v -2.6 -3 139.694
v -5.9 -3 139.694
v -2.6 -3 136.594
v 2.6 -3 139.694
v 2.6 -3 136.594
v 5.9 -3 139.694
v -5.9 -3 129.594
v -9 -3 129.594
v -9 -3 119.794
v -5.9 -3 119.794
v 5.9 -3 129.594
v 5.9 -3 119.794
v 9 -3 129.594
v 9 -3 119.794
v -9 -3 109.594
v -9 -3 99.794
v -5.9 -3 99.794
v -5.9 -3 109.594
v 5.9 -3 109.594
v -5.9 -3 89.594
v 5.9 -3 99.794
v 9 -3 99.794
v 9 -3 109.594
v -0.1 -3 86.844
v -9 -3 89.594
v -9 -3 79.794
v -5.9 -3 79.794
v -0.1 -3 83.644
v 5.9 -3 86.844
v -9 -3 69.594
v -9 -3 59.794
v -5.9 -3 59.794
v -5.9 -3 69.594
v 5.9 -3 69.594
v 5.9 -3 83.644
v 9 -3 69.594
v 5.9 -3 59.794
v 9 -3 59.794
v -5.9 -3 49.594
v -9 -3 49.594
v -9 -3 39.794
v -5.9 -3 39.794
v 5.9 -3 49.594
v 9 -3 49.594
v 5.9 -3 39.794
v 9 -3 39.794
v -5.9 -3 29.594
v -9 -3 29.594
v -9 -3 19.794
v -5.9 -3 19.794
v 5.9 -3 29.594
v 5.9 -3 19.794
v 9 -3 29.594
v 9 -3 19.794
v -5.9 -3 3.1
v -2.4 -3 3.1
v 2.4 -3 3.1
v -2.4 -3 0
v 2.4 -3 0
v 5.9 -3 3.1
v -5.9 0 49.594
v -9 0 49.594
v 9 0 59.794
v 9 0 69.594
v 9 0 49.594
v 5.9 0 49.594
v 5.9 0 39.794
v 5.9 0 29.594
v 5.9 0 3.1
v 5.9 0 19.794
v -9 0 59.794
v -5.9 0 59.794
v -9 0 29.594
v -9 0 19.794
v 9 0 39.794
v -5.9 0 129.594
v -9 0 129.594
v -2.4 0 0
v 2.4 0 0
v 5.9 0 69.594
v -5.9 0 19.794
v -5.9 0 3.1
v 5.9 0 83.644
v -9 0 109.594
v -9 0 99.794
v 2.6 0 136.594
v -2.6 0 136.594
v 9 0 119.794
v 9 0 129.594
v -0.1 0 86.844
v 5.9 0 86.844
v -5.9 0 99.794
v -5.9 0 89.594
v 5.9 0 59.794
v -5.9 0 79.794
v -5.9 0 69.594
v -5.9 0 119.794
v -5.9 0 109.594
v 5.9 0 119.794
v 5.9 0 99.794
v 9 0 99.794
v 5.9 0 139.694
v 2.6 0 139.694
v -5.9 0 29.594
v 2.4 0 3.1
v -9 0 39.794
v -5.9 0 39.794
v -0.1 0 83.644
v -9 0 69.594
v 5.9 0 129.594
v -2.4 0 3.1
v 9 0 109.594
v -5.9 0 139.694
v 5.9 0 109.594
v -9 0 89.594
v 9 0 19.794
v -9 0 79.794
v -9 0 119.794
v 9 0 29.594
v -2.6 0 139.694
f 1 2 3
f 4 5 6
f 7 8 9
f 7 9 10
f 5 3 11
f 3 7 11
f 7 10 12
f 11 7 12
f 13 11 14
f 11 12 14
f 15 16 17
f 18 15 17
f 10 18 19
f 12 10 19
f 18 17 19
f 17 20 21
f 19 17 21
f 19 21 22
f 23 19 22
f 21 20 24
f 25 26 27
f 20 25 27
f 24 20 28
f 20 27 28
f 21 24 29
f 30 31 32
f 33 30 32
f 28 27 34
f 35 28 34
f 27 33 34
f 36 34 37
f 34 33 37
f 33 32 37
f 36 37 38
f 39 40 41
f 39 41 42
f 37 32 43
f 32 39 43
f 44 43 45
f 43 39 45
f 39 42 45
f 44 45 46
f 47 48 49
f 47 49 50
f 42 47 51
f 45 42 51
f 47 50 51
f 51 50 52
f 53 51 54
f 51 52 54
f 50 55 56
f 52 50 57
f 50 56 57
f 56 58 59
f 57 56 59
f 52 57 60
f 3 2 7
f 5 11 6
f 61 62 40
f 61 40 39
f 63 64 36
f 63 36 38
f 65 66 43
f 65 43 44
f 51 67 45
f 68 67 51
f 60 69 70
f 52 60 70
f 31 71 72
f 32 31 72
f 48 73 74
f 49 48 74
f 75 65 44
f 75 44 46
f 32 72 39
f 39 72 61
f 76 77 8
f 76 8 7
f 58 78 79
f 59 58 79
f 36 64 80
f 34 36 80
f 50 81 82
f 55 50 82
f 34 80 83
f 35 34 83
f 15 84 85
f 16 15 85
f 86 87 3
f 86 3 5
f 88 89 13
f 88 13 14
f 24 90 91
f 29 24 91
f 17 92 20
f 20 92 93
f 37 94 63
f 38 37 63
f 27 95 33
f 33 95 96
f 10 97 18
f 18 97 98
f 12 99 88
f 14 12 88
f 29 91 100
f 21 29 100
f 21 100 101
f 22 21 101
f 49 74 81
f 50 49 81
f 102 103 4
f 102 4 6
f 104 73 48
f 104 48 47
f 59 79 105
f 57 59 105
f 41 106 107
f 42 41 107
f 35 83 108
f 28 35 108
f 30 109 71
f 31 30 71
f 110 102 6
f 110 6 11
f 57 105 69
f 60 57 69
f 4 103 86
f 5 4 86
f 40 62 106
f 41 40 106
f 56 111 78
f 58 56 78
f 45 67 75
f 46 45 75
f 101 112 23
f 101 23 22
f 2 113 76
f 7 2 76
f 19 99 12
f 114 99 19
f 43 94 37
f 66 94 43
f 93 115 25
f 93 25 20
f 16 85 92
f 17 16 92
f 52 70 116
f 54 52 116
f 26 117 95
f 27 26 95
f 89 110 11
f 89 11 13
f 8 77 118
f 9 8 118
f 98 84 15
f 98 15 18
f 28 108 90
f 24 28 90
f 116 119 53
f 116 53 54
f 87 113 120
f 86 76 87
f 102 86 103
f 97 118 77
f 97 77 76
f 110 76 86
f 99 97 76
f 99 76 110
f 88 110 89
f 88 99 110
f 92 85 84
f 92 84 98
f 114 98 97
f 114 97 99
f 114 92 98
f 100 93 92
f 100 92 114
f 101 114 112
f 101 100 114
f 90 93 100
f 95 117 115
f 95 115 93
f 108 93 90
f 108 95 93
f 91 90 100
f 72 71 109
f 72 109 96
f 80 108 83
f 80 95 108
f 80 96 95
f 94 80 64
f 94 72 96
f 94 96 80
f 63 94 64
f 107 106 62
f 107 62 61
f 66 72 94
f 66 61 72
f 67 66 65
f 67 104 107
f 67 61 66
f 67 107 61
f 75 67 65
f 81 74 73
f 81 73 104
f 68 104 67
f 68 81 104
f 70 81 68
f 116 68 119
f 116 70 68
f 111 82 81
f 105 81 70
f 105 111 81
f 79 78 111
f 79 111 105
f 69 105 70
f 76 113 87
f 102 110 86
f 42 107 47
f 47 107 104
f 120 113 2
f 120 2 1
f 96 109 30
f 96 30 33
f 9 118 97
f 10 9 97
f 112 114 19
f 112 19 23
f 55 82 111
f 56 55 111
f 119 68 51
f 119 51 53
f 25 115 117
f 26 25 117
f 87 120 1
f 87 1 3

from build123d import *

# Parameters (mm, degrees)
SKETCH1_W           = 18
SKETCH1_H           = 139.694434203
BOSS_EXTRUDE1_DEPTH = 3
SKETCH4_W           = 3.2
SKETCH4_H           = 10.2
SKETCH4_W_2         = 5.2
SKETCH4_H_2         = 3.2
CUT_EXTRUDE2_DEPTH  = 4


with BuildPart() as part:
    # Sketch1 → Boss-Extrude1 (new body)
    with BuildSketch(Plane(origin=(0, 0, 0), x_dir=(1, 0, 0), z_dir=(0, 1, 0))):
        with Locations((0, -69.847217102)):
            Rectangle(SKETCH1_W, SKETCH1_H)
    extrude(amount=-BOSS_EXTRUDE1_DEPTH)

    # Sketch4 → Cut-Extrude2 (cut, through all)
    with BuildSketch(Plane(origin=(0, 0, 0), x_dir=(1, 0, 0), z_dir=(0, 1, 0))):
        Polygon((5.9, -19.794434203), (9.1, -19.794434203), (9.1, 0.1), (2.4, 0.1), (2.4, -3.1), (5.9, -3.1), align=None)
        with Locations((7.5, -54.694434203)):
            Rectangle(SKETCH4_W, SKETCH4_H)
        with Locations((7.5, -34.694434203)):
            Rectangle(SKETCH4_W, SKETCH4_H)
        with Locations((7.5, -134.694434203)):
            Rectangle(SKETCH4_W, SKETCH4_H)
        with Locations((7.5, -114.694434203)):
            Rectangle(SKETCH4_W, SKETCH4_H)
        with Locations((-7.5, -54.694434203)):
            Rectangle(SKETCH4_W, SKETCH4_H)
        with Locations((-7.5, -114.694434203)):
            Rectangle(SKETCH4_W, SKETCH4_H)
        with Locations((-7.5, -74.694434203)):
            Rectangle(SKETCH4_W, SKETCH4_H)
        with Locations((-7.5, -134.694434203)):
            Rectangle(SKETCH4_W, SKETCH4_H)
        with Locations((-7.5, -34.694434203)):
            Rectangle(SKETCH4_W, SKETCH4_H)
        with Locations((-7.5, -94.694434203)):
            Rectangle(SKETCH4_W, SKETCH4_H)
        Polygon((5.9, -83.644434203), (-0.1, -83.644434203), (-0.1, -86.844434203), (5.9, -86.844434203), (5.9, -99.794434203), (9.1, -99.794434203), (9.1, -69.594434203), (5.9, -69.594434203), align=None)
        with Locations((0, -138.194434203)):
            Rectangle(SKETCH4_W_2, SKETCH4_H_2)
        Polygon((-9.1, 0.1), (-9.1, -19.794434203), (-5.9, -19.794434203), (-5.9, -3.1), (-2.4, -3.1), (-2.4, 0.1), align=None)
    extrude(amount=-CUT_EXTRUDE2_DEPTH, mode=Mode.SUBTRACT)


solid = part.part
